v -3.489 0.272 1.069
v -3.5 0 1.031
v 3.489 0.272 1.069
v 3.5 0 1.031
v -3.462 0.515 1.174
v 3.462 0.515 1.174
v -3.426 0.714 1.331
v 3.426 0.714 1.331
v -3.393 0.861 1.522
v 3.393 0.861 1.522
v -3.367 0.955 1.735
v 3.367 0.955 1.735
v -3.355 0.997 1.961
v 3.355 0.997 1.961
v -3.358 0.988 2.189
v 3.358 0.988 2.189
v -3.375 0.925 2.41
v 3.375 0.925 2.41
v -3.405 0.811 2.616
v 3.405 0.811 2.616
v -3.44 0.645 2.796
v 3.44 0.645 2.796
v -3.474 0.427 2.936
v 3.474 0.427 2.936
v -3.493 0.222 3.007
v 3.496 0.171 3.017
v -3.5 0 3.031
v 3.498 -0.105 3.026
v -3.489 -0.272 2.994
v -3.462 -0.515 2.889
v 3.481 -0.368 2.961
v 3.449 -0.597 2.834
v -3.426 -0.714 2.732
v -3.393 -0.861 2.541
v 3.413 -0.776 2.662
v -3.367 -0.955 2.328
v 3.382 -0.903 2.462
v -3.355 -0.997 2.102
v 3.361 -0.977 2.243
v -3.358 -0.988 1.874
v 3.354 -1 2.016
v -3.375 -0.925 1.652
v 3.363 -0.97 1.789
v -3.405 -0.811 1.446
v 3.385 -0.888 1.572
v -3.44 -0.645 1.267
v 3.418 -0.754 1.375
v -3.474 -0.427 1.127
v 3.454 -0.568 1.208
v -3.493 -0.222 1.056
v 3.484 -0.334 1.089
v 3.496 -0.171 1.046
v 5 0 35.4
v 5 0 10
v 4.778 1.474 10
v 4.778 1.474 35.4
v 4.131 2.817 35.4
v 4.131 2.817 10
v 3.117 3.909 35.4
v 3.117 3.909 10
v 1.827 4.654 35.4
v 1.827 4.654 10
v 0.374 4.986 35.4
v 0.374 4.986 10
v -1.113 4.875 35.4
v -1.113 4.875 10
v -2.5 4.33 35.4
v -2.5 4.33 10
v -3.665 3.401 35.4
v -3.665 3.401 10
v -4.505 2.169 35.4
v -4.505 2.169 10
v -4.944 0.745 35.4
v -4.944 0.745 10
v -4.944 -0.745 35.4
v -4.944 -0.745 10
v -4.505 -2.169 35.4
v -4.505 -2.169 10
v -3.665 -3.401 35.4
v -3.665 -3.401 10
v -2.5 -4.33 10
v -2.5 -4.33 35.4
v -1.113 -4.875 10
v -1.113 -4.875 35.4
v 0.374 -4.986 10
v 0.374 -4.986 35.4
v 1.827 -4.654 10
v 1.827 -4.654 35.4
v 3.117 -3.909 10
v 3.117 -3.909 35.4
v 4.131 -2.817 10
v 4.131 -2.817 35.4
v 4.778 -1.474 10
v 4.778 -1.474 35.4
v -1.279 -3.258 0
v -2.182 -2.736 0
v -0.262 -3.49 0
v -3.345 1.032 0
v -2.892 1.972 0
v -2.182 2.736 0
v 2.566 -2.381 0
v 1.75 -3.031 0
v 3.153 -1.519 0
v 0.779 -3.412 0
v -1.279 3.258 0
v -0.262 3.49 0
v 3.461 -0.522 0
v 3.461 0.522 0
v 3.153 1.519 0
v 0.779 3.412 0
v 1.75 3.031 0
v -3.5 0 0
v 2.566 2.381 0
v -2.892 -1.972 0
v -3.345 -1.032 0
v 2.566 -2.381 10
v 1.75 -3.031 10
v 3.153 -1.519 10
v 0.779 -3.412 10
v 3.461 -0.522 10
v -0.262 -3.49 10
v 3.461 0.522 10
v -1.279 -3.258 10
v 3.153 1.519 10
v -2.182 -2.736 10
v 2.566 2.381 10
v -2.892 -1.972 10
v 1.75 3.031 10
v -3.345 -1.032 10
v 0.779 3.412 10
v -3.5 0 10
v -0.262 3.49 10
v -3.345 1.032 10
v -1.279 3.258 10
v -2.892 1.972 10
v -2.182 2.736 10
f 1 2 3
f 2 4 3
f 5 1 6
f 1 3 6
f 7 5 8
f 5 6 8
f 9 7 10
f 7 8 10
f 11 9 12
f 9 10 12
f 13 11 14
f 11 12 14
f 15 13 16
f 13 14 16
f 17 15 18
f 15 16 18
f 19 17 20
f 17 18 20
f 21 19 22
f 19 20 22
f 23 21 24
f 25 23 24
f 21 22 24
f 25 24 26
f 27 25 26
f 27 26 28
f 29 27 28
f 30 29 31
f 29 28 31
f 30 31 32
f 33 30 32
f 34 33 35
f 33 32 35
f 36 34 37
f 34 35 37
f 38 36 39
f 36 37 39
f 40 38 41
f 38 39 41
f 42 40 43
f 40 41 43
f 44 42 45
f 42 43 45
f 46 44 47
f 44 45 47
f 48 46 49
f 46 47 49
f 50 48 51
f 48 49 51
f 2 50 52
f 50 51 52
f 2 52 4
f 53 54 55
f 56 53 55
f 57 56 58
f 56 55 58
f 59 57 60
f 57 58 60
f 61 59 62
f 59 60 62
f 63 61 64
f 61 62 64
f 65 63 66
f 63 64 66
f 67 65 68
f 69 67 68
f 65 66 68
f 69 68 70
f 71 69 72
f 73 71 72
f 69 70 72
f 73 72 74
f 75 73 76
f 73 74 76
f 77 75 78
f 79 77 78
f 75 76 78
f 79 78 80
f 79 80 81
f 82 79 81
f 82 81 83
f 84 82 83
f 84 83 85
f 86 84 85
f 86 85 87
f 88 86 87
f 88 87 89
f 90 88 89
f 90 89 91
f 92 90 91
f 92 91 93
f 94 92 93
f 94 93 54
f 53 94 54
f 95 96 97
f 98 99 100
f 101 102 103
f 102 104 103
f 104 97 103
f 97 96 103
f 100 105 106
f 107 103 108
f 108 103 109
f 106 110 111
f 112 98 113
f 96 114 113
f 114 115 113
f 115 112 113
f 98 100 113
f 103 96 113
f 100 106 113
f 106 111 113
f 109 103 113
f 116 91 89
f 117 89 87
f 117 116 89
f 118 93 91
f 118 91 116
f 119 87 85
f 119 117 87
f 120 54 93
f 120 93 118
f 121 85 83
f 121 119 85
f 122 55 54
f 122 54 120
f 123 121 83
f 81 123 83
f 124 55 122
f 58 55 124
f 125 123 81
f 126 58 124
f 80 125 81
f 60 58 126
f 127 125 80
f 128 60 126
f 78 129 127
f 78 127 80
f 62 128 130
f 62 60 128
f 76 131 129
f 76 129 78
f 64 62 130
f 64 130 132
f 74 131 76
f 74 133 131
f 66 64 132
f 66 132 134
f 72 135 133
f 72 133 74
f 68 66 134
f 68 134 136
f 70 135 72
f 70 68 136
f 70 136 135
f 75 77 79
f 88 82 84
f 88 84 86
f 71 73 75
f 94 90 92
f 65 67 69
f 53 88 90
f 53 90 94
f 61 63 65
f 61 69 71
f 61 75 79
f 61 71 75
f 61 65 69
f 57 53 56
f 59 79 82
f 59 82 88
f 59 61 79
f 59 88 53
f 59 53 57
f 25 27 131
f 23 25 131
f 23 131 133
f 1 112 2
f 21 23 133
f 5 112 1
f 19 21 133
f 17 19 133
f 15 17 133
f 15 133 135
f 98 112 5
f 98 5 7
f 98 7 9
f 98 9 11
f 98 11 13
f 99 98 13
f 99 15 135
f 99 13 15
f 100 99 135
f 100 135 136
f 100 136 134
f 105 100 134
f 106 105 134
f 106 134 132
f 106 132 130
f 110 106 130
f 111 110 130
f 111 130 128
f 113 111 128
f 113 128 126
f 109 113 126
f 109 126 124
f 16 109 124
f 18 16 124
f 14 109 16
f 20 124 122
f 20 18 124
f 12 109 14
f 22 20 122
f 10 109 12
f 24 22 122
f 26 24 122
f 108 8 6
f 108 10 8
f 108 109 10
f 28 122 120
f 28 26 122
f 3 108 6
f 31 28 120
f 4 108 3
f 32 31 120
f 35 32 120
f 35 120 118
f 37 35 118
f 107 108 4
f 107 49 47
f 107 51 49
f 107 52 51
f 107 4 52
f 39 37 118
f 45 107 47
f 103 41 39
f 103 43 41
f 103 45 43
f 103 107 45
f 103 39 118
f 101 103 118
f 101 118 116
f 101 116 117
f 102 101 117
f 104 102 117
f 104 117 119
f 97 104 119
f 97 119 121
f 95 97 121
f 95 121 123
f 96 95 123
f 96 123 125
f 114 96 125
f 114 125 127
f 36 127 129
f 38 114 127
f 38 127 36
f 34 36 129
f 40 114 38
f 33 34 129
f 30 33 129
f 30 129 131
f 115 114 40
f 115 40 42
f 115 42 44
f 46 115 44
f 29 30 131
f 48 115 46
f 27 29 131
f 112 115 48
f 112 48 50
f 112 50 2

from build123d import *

# Parameters (mm, degrees)
SKETCH1_R               = 5
BOSS_EXTRUDE1_DEPTH     = 35.4
SKETCH2_R               = 1
CUT_EXTRUDE1_DEPTH      = 6
CUT_EXTRUDE1_DEPTH_BACK = 6
SKETCH3_OUTSIDE_W       = 19.624
SKETCH3_OUTSIDE_H       = 19.624
SKETCH3_OUTSIDE_R       = 3.5
CUT_EXTRUDE2_DEPTH      = 10


with BuildPart() as part:
    # Sketch1 → Boss-Extrude1 (new body)
    with BuildSketch(Plane.XY):
        Circle(SKETCH1_R)
    extrude(amount=BOSS_EXTRUDE1_DEPTH)

    # Sketch2 → Cut-Extrude1 (cut, two sides)
    with BuildSketch(Plane(origin=(0, 0, 0), x_dir=(0, 0, -1), z_dir=(1, 0, 0))) as cut_extrude1_sk:
        with Locations((-2.031417136, 0)):
            Circle(SKETCH2_R)
    extrude(amount=CUT_EXTRUDE1_DEPTH, mode=Mode.SUBTRACT)
    extrude(cut_extrude1_sk.sketch, amount=-CUT_EXTRUDE1_DEPTH_BACK, mode=Mode.SUBTRACT)

    # Sketch3 outside → Cut-Extrude2 (cut)
    with BuildSketch(Plane(origin=(0, 0, 0), x_dir=(-1, 0, 0), z_dir=(0, 0, -1))):
        Rectangle(SKETCH3_OUTSIDE_W, SKETCH3_OUTSIDE_H)
        Circle(SKETCH3_OUTSIDE_R, mode=Mode.SUBTRACT)
    extrude(amount=-CUT_EXTRUDE2_DEPTH, mode=Mode.SUBTRACT)


solid = part.part
